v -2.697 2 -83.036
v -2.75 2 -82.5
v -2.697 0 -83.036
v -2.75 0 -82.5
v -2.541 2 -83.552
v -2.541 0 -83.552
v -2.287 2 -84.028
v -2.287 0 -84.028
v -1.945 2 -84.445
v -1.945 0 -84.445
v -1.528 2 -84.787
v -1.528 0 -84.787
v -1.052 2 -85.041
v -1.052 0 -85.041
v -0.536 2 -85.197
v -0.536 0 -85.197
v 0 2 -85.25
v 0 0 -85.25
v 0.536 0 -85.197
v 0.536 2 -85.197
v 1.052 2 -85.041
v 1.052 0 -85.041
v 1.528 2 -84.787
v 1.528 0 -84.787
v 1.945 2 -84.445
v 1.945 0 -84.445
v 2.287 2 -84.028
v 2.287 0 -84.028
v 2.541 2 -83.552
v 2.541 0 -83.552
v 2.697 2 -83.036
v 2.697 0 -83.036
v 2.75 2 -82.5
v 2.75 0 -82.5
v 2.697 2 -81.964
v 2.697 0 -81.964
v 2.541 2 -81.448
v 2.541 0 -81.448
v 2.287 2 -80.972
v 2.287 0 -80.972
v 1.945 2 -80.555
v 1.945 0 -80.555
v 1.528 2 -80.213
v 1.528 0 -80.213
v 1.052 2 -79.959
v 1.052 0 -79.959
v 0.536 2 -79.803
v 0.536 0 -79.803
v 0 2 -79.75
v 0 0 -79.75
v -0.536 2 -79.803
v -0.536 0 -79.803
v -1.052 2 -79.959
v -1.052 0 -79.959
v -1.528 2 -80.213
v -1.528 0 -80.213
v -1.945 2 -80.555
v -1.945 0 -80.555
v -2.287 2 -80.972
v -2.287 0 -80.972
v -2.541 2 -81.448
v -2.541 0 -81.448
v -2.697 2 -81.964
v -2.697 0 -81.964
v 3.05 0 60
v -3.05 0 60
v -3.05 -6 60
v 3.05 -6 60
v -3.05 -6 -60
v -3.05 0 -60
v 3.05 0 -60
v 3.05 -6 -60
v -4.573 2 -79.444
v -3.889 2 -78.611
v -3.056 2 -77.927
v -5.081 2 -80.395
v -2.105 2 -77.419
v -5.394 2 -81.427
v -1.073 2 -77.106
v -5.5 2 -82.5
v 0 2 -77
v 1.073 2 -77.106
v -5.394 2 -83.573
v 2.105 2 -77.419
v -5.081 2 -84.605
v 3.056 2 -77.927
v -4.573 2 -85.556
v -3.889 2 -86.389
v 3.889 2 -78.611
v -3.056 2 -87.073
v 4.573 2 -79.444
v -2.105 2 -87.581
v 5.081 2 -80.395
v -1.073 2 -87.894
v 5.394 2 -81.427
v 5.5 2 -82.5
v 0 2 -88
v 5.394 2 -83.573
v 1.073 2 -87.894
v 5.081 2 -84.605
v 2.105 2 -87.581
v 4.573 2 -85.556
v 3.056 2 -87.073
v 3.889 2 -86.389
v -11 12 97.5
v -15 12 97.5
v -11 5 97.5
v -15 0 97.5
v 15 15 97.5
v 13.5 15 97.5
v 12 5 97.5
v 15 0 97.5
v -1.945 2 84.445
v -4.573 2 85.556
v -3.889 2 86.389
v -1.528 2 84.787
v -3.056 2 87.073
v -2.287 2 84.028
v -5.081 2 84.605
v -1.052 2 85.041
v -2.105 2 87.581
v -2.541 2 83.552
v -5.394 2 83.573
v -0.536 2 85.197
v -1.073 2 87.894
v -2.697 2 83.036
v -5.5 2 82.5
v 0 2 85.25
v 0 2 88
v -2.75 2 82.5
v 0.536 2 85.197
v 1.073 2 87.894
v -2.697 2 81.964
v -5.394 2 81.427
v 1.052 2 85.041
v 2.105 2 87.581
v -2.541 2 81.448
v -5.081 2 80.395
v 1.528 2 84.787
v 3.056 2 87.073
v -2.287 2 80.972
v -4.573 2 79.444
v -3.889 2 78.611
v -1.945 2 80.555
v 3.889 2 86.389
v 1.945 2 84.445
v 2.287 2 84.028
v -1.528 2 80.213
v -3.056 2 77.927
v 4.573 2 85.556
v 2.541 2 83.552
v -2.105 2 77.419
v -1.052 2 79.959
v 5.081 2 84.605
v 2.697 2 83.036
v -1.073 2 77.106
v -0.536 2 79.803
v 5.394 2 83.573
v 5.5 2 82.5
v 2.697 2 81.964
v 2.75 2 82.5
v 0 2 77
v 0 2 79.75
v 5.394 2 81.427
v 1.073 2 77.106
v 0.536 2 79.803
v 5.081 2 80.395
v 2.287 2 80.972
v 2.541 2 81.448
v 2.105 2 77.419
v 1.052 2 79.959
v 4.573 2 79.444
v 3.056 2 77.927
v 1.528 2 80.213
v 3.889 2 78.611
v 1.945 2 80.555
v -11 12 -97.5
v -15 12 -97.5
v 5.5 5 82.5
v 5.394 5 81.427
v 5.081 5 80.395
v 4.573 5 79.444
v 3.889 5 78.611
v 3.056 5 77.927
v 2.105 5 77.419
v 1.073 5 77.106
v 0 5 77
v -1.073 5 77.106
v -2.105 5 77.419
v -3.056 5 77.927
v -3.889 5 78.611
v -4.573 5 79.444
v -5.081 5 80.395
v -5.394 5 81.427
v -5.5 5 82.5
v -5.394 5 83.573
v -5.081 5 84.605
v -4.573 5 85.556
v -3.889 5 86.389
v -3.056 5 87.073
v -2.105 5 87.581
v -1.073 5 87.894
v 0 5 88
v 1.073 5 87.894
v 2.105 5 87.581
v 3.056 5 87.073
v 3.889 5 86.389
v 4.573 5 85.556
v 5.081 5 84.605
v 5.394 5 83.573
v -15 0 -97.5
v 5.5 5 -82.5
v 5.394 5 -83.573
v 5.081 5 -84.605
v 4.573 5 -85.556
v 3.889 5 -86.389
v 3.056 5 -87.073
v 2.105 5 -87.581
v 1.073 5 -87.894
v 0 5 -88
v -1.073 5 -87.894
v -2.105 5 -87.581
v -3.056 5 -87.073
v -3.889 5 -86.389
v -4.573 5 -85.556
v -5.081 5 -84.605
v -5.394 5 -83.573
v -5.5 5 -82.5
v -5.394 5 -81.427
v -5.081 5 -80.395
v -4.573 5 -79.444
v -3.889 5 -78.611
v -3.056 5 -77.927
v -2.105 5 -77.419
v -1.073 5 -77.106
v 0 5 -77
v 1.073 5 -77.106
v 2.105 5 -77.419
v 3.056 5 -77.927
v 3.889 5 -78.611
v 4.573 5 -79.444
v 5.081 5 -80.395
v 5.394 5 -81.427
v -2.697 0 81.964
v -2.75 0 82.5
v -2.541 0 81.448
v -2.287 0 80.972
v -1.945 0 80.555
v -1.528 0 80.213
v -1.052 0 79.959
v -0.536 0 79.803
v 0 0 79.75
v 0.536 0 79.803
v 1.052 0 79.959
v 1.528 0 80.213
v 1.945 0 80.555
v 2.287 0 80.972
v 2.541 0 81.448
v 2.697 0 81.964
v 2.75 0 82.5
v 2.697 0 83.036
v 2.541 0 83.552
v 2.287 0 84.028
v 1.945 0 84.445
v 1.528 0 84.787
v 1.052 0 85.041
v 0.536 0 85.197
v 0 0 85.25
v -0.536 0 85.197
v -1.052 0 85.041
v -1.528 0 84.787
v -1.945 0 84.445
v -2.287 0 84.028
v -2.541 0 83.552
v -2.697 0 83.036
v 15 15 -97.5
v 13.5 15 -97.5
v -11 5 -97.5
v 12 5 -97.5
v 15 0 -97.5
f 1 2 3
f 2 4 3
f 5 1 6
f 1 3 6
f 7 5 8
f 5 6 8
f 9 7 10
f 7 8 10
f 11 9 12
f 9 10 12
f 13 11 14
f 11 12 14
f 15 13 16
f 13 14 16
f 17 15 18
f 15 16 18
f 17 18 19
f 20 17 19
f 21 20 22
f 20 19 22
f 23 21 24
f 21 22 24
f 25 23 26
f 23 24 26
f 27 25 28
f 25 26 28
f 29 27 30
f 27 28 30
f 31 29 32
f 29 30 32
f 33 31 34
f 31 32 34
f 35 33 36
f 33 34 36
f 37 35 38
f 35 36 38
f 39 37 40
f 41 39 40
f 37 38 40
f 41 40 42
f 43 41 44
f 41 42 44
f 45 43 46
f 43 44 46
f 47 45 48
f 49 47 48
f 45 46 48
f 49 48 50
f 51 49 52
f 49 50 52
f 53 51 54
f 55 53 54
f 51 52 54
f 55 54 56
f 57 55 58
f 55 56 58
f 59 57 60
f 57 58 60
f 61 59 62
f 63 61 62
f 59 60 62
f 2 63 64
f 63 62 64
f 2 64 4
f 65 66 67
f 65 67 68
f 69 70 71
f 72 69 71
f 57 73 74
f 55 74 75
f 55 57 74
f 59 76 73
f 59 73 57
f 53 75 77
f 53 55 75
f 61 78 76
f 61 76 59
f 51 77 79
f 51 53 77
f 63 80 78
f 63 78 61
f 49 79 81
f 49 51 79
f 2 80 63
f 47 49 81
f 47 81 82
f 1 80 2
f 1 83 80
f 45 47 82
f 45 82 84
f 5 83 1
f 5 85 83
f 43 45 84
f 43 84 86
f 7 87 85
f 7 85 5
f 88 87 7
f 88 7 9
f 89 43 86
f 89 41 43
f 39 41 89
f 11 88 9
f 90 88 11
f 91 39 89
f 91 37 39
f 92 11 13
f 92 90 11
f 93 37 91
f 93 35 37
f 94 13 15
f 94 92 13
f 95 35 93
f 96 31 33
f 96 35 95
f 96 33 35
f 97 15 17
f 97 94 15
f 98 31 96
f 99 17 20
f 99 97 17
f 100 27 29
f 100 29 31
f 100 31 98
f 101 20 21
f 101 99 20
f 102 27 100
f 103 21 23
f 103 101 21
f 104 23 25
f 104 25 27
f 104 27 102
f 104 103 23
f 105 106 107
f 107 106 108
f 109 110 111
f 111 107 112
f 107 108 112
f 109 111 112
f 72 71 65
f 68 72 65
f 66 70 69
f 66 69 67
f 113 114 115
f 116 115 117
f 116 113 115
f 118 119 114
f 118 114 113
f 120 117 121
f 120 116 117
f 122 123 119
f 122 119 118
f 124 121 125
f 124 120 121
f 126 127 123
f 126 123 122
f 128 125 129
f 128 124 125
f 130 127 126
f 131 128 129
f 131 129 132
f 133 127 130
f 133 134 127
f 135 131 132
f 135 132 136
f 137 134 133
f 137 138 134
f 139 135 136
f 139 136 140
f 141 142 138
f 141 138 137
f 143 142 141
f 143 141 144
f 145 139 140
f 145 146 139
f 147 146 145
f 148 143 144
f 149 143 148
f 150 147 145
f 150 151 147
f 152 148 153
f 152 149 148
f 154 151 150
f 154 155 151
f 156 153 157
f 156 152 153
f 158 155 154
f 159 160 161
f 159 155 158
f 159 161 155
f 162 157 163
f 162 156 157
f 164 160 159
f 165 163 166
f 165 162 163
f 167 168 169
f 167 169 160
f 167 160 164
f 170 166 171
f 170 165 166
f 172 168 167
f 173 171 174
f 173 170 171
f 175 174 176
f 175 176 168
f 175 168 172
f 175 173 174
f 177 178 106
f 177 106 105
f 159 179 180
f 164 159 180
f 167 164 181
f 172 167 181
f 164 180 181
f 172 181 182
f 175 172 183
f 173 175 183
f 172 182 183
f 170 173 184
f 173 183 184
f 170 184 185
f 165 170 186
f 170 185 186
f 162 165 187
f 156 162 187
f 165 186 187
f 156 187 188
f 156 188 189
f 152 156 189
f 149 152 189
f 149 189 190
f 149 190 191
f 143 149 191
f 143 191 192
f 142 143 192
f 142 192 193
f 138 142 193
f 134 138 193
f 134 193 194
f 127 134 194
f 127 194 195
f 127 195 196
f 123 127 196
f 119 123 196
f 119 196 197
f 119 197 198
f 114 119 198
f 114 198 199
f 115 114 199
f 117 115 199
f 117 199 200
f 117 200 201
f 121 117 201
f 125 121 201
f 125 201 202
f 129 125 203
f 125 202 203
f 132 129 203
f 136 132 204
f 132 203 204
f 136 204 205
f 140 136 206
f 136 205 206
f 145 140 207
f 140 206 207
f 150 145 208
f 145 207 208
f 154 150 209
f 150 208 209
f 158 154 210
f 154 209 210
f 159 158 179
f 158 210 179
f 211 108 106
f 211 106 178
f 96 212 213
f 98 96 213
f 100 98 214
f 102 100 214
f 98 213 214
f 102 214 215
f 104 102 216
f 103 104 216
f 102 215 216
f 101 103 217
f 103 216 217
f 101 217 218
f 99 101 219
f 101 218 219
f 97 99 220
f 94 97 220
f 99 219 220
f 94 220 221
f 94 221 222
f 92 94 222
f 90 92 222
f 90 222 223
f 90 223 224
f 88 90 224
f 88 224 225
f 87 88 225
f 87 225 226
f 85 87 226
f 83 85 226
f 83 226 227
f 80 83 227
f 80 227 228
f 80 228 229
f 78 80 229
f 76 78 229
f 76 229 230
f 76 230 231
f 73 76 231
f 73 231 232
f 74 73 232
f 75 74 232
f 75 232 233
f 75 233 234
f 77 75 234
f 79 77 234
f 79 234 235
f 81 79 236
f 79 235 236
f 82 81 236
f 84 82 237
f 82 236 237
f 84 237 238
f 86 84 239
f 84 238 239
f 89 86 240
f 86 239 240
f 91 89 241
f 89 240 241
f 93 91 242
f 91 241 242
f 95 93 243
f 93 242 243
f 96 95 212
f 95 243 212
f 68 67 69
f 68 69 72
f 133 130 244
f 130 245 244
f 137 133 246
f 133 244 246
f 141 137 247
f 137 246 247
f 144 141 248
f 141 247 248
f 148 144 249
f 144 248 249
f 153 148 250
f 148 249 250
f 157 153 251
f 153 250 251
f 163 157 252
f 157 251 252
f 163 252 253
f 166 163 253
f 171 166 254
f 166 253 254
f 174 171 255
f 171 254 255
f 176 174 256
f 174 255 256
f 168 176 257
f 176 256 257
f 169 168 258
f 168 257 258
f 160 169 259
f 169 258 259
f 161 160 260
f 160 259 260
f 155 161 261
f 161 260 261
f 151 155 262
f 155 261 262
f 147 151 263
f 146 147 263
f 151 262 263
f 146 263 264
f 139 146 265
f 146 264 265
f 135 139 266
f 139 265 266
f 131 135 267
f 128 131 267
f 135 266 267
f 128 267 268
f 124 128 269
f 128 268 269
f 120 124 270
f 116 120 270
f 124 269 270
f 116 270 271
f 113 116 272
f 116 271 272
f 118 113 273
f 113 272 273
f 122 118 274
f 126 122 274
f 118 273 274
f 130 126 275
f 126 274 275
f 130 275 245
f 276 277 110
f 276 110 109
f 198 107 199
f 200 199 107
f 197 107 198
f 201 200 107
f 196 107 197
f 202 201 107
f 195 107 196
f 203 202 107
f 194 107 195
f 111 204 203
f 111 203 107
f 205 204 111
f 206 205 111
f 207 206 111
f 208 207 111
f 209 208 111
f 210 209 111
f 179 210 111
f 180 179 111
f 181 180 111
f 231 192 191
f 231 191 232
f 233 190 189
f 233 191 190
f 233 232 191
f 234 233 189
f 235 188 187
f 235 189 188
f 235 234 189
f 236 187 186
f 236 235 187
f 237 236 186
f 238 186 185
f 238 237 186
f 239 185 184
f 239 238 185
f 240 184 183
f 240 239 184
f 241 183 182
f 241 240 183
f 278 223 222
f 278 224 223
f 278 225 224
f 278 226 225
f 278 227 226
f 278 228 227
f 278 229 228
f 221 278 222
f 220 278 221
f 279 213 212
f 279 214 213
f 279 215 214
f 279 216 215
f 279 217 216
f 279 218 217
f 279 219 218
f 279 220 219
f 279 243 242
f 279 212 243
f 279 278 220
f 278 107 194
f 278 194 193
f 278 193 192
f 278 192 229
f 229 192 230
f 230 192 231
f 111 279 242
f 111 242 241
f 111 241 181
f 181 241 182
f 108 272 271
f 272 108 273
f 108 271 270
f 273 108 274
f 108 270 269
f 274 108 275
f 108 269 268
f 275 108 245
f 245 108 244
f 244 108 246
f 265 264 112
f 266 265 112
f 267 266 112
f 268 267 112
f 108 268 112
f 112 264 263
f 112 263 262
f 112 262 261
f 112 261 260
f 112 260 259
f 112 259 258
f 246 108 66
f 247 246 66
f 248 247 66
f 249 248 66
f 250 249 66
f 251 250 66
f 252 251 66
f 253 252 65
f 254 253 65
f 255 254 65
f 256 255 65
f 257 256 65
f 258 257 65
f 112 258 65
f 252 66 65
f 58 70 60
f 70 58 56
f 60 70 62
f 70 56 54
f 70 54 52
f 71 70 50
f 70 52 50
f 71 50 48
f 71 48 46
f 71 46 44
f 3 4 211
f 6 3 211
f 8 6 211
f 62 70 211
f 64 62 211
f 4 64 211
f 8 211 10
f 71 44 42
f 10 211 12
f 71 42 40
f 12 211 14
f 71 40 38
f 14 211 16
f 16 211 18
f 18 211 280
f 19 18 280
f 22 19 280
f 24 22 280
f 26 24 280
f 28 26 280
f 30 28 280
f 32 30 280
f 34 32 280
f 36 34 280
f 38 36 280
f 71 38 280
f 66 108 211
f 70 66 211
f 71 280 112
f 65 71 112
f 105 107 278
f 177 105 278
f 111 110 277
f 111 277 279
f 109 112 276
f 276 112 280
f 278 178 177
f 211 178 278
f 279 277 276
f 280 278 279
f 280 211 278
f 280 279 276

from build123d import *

# Parameters (mm, degrees)
SKETCH_1_W                   = 30
SKETCH_1_H                   = 195
EXTRUDE_1_DEPTH              = 5
SKETCH_2_W                   = 4
SKETCH_2_H                   = 195
SKETCH_2_W_2                 = 3
EXTRUDE_2_DEPTH              = 10
SKETCH_3_W                   = 4
SKETCH_3_H                   = 3
CUT_EXTRUDE_1_DEPTH          = 197.150452459
HOLE_WIZARD_M5_1_D           = 5.5
HOLE_WIZARD_M5_1_CBORE_D     = 11
HOLE_WIZARD_M5_1_CBORE_DEPTH = 3
SKETCH_7_W                   = 6.1
SKETCH_7_H                   = 120
EXTRUDE_3_DEPTH              = 6


with BuildPart() as part:
    # 스케치1 → 보스-돌출1 (new body)
    with BuildSketch(Plane(origin=(0, 0, 0), x_dir=(1, 0, 0), z_dir=(0, 1, 0))):
        Rectangle(SKETCH_1_W, SKETCH_1_H)
    extrude(amount=EXTRUDE_1_DEPTH)

    # 스케치2 → 보스-돌출2 (add)
    with BuildSketch(Plane(origin=(0, 5, 0), x_dir=(1, 0, 0), z_dir=(0, 1, 0))):
        with Locations((-13, 0)):
            Rectangle(SKETCH_2_W, SKETCH_2_H)
        with Locations((13.5, 0)):
            Rectangle(SKETCH_2_W_2, SKETCH_2_H)
    extrude(amount=EXTRUDE_2_DEPTH)

    # 스케치3 → 컷-돌출1 (cut, through all)
    with BuildSketch(Plane.XY.offset(97.5)):
        with Locations((-13, 13.5)):
            Rectangle(SKETCH_3_W, SKETCH_3_H)
        Polygon((12, 5), (12, 15), (13.5, 15), align=None)
    extrude(amount=-CUT_EXTRUDE_1_DEPTH, mode=Mode.SUBTRACT)

    # M5 소켓 머리 캡 나사용 카운터보어1 (through all)
    with Locations(Plane(origin=(0, 5, 0), x_dir=(1, 0, 0), z_dir=(0, 1, 0))):
        with Locations((0, -82.5), (0, 82.5)):
            CounterBoreHole(HOLE_WIZARD_M5_1_D / 2, HOLE_WIZARD_M5_1_CBORE_D / 2, HOLE_WIZARD_M5_1_CBORE_DEPTH)

    # 스케치7 → 보스-돌출3 (add)
    with BuildSketch(Plane.XZ):
        Rectangle(SKETCH_7_W, SKETCH_7_H)
    extrude(amount=EXTRUDE_3_DEPTH)


solid = part.part
